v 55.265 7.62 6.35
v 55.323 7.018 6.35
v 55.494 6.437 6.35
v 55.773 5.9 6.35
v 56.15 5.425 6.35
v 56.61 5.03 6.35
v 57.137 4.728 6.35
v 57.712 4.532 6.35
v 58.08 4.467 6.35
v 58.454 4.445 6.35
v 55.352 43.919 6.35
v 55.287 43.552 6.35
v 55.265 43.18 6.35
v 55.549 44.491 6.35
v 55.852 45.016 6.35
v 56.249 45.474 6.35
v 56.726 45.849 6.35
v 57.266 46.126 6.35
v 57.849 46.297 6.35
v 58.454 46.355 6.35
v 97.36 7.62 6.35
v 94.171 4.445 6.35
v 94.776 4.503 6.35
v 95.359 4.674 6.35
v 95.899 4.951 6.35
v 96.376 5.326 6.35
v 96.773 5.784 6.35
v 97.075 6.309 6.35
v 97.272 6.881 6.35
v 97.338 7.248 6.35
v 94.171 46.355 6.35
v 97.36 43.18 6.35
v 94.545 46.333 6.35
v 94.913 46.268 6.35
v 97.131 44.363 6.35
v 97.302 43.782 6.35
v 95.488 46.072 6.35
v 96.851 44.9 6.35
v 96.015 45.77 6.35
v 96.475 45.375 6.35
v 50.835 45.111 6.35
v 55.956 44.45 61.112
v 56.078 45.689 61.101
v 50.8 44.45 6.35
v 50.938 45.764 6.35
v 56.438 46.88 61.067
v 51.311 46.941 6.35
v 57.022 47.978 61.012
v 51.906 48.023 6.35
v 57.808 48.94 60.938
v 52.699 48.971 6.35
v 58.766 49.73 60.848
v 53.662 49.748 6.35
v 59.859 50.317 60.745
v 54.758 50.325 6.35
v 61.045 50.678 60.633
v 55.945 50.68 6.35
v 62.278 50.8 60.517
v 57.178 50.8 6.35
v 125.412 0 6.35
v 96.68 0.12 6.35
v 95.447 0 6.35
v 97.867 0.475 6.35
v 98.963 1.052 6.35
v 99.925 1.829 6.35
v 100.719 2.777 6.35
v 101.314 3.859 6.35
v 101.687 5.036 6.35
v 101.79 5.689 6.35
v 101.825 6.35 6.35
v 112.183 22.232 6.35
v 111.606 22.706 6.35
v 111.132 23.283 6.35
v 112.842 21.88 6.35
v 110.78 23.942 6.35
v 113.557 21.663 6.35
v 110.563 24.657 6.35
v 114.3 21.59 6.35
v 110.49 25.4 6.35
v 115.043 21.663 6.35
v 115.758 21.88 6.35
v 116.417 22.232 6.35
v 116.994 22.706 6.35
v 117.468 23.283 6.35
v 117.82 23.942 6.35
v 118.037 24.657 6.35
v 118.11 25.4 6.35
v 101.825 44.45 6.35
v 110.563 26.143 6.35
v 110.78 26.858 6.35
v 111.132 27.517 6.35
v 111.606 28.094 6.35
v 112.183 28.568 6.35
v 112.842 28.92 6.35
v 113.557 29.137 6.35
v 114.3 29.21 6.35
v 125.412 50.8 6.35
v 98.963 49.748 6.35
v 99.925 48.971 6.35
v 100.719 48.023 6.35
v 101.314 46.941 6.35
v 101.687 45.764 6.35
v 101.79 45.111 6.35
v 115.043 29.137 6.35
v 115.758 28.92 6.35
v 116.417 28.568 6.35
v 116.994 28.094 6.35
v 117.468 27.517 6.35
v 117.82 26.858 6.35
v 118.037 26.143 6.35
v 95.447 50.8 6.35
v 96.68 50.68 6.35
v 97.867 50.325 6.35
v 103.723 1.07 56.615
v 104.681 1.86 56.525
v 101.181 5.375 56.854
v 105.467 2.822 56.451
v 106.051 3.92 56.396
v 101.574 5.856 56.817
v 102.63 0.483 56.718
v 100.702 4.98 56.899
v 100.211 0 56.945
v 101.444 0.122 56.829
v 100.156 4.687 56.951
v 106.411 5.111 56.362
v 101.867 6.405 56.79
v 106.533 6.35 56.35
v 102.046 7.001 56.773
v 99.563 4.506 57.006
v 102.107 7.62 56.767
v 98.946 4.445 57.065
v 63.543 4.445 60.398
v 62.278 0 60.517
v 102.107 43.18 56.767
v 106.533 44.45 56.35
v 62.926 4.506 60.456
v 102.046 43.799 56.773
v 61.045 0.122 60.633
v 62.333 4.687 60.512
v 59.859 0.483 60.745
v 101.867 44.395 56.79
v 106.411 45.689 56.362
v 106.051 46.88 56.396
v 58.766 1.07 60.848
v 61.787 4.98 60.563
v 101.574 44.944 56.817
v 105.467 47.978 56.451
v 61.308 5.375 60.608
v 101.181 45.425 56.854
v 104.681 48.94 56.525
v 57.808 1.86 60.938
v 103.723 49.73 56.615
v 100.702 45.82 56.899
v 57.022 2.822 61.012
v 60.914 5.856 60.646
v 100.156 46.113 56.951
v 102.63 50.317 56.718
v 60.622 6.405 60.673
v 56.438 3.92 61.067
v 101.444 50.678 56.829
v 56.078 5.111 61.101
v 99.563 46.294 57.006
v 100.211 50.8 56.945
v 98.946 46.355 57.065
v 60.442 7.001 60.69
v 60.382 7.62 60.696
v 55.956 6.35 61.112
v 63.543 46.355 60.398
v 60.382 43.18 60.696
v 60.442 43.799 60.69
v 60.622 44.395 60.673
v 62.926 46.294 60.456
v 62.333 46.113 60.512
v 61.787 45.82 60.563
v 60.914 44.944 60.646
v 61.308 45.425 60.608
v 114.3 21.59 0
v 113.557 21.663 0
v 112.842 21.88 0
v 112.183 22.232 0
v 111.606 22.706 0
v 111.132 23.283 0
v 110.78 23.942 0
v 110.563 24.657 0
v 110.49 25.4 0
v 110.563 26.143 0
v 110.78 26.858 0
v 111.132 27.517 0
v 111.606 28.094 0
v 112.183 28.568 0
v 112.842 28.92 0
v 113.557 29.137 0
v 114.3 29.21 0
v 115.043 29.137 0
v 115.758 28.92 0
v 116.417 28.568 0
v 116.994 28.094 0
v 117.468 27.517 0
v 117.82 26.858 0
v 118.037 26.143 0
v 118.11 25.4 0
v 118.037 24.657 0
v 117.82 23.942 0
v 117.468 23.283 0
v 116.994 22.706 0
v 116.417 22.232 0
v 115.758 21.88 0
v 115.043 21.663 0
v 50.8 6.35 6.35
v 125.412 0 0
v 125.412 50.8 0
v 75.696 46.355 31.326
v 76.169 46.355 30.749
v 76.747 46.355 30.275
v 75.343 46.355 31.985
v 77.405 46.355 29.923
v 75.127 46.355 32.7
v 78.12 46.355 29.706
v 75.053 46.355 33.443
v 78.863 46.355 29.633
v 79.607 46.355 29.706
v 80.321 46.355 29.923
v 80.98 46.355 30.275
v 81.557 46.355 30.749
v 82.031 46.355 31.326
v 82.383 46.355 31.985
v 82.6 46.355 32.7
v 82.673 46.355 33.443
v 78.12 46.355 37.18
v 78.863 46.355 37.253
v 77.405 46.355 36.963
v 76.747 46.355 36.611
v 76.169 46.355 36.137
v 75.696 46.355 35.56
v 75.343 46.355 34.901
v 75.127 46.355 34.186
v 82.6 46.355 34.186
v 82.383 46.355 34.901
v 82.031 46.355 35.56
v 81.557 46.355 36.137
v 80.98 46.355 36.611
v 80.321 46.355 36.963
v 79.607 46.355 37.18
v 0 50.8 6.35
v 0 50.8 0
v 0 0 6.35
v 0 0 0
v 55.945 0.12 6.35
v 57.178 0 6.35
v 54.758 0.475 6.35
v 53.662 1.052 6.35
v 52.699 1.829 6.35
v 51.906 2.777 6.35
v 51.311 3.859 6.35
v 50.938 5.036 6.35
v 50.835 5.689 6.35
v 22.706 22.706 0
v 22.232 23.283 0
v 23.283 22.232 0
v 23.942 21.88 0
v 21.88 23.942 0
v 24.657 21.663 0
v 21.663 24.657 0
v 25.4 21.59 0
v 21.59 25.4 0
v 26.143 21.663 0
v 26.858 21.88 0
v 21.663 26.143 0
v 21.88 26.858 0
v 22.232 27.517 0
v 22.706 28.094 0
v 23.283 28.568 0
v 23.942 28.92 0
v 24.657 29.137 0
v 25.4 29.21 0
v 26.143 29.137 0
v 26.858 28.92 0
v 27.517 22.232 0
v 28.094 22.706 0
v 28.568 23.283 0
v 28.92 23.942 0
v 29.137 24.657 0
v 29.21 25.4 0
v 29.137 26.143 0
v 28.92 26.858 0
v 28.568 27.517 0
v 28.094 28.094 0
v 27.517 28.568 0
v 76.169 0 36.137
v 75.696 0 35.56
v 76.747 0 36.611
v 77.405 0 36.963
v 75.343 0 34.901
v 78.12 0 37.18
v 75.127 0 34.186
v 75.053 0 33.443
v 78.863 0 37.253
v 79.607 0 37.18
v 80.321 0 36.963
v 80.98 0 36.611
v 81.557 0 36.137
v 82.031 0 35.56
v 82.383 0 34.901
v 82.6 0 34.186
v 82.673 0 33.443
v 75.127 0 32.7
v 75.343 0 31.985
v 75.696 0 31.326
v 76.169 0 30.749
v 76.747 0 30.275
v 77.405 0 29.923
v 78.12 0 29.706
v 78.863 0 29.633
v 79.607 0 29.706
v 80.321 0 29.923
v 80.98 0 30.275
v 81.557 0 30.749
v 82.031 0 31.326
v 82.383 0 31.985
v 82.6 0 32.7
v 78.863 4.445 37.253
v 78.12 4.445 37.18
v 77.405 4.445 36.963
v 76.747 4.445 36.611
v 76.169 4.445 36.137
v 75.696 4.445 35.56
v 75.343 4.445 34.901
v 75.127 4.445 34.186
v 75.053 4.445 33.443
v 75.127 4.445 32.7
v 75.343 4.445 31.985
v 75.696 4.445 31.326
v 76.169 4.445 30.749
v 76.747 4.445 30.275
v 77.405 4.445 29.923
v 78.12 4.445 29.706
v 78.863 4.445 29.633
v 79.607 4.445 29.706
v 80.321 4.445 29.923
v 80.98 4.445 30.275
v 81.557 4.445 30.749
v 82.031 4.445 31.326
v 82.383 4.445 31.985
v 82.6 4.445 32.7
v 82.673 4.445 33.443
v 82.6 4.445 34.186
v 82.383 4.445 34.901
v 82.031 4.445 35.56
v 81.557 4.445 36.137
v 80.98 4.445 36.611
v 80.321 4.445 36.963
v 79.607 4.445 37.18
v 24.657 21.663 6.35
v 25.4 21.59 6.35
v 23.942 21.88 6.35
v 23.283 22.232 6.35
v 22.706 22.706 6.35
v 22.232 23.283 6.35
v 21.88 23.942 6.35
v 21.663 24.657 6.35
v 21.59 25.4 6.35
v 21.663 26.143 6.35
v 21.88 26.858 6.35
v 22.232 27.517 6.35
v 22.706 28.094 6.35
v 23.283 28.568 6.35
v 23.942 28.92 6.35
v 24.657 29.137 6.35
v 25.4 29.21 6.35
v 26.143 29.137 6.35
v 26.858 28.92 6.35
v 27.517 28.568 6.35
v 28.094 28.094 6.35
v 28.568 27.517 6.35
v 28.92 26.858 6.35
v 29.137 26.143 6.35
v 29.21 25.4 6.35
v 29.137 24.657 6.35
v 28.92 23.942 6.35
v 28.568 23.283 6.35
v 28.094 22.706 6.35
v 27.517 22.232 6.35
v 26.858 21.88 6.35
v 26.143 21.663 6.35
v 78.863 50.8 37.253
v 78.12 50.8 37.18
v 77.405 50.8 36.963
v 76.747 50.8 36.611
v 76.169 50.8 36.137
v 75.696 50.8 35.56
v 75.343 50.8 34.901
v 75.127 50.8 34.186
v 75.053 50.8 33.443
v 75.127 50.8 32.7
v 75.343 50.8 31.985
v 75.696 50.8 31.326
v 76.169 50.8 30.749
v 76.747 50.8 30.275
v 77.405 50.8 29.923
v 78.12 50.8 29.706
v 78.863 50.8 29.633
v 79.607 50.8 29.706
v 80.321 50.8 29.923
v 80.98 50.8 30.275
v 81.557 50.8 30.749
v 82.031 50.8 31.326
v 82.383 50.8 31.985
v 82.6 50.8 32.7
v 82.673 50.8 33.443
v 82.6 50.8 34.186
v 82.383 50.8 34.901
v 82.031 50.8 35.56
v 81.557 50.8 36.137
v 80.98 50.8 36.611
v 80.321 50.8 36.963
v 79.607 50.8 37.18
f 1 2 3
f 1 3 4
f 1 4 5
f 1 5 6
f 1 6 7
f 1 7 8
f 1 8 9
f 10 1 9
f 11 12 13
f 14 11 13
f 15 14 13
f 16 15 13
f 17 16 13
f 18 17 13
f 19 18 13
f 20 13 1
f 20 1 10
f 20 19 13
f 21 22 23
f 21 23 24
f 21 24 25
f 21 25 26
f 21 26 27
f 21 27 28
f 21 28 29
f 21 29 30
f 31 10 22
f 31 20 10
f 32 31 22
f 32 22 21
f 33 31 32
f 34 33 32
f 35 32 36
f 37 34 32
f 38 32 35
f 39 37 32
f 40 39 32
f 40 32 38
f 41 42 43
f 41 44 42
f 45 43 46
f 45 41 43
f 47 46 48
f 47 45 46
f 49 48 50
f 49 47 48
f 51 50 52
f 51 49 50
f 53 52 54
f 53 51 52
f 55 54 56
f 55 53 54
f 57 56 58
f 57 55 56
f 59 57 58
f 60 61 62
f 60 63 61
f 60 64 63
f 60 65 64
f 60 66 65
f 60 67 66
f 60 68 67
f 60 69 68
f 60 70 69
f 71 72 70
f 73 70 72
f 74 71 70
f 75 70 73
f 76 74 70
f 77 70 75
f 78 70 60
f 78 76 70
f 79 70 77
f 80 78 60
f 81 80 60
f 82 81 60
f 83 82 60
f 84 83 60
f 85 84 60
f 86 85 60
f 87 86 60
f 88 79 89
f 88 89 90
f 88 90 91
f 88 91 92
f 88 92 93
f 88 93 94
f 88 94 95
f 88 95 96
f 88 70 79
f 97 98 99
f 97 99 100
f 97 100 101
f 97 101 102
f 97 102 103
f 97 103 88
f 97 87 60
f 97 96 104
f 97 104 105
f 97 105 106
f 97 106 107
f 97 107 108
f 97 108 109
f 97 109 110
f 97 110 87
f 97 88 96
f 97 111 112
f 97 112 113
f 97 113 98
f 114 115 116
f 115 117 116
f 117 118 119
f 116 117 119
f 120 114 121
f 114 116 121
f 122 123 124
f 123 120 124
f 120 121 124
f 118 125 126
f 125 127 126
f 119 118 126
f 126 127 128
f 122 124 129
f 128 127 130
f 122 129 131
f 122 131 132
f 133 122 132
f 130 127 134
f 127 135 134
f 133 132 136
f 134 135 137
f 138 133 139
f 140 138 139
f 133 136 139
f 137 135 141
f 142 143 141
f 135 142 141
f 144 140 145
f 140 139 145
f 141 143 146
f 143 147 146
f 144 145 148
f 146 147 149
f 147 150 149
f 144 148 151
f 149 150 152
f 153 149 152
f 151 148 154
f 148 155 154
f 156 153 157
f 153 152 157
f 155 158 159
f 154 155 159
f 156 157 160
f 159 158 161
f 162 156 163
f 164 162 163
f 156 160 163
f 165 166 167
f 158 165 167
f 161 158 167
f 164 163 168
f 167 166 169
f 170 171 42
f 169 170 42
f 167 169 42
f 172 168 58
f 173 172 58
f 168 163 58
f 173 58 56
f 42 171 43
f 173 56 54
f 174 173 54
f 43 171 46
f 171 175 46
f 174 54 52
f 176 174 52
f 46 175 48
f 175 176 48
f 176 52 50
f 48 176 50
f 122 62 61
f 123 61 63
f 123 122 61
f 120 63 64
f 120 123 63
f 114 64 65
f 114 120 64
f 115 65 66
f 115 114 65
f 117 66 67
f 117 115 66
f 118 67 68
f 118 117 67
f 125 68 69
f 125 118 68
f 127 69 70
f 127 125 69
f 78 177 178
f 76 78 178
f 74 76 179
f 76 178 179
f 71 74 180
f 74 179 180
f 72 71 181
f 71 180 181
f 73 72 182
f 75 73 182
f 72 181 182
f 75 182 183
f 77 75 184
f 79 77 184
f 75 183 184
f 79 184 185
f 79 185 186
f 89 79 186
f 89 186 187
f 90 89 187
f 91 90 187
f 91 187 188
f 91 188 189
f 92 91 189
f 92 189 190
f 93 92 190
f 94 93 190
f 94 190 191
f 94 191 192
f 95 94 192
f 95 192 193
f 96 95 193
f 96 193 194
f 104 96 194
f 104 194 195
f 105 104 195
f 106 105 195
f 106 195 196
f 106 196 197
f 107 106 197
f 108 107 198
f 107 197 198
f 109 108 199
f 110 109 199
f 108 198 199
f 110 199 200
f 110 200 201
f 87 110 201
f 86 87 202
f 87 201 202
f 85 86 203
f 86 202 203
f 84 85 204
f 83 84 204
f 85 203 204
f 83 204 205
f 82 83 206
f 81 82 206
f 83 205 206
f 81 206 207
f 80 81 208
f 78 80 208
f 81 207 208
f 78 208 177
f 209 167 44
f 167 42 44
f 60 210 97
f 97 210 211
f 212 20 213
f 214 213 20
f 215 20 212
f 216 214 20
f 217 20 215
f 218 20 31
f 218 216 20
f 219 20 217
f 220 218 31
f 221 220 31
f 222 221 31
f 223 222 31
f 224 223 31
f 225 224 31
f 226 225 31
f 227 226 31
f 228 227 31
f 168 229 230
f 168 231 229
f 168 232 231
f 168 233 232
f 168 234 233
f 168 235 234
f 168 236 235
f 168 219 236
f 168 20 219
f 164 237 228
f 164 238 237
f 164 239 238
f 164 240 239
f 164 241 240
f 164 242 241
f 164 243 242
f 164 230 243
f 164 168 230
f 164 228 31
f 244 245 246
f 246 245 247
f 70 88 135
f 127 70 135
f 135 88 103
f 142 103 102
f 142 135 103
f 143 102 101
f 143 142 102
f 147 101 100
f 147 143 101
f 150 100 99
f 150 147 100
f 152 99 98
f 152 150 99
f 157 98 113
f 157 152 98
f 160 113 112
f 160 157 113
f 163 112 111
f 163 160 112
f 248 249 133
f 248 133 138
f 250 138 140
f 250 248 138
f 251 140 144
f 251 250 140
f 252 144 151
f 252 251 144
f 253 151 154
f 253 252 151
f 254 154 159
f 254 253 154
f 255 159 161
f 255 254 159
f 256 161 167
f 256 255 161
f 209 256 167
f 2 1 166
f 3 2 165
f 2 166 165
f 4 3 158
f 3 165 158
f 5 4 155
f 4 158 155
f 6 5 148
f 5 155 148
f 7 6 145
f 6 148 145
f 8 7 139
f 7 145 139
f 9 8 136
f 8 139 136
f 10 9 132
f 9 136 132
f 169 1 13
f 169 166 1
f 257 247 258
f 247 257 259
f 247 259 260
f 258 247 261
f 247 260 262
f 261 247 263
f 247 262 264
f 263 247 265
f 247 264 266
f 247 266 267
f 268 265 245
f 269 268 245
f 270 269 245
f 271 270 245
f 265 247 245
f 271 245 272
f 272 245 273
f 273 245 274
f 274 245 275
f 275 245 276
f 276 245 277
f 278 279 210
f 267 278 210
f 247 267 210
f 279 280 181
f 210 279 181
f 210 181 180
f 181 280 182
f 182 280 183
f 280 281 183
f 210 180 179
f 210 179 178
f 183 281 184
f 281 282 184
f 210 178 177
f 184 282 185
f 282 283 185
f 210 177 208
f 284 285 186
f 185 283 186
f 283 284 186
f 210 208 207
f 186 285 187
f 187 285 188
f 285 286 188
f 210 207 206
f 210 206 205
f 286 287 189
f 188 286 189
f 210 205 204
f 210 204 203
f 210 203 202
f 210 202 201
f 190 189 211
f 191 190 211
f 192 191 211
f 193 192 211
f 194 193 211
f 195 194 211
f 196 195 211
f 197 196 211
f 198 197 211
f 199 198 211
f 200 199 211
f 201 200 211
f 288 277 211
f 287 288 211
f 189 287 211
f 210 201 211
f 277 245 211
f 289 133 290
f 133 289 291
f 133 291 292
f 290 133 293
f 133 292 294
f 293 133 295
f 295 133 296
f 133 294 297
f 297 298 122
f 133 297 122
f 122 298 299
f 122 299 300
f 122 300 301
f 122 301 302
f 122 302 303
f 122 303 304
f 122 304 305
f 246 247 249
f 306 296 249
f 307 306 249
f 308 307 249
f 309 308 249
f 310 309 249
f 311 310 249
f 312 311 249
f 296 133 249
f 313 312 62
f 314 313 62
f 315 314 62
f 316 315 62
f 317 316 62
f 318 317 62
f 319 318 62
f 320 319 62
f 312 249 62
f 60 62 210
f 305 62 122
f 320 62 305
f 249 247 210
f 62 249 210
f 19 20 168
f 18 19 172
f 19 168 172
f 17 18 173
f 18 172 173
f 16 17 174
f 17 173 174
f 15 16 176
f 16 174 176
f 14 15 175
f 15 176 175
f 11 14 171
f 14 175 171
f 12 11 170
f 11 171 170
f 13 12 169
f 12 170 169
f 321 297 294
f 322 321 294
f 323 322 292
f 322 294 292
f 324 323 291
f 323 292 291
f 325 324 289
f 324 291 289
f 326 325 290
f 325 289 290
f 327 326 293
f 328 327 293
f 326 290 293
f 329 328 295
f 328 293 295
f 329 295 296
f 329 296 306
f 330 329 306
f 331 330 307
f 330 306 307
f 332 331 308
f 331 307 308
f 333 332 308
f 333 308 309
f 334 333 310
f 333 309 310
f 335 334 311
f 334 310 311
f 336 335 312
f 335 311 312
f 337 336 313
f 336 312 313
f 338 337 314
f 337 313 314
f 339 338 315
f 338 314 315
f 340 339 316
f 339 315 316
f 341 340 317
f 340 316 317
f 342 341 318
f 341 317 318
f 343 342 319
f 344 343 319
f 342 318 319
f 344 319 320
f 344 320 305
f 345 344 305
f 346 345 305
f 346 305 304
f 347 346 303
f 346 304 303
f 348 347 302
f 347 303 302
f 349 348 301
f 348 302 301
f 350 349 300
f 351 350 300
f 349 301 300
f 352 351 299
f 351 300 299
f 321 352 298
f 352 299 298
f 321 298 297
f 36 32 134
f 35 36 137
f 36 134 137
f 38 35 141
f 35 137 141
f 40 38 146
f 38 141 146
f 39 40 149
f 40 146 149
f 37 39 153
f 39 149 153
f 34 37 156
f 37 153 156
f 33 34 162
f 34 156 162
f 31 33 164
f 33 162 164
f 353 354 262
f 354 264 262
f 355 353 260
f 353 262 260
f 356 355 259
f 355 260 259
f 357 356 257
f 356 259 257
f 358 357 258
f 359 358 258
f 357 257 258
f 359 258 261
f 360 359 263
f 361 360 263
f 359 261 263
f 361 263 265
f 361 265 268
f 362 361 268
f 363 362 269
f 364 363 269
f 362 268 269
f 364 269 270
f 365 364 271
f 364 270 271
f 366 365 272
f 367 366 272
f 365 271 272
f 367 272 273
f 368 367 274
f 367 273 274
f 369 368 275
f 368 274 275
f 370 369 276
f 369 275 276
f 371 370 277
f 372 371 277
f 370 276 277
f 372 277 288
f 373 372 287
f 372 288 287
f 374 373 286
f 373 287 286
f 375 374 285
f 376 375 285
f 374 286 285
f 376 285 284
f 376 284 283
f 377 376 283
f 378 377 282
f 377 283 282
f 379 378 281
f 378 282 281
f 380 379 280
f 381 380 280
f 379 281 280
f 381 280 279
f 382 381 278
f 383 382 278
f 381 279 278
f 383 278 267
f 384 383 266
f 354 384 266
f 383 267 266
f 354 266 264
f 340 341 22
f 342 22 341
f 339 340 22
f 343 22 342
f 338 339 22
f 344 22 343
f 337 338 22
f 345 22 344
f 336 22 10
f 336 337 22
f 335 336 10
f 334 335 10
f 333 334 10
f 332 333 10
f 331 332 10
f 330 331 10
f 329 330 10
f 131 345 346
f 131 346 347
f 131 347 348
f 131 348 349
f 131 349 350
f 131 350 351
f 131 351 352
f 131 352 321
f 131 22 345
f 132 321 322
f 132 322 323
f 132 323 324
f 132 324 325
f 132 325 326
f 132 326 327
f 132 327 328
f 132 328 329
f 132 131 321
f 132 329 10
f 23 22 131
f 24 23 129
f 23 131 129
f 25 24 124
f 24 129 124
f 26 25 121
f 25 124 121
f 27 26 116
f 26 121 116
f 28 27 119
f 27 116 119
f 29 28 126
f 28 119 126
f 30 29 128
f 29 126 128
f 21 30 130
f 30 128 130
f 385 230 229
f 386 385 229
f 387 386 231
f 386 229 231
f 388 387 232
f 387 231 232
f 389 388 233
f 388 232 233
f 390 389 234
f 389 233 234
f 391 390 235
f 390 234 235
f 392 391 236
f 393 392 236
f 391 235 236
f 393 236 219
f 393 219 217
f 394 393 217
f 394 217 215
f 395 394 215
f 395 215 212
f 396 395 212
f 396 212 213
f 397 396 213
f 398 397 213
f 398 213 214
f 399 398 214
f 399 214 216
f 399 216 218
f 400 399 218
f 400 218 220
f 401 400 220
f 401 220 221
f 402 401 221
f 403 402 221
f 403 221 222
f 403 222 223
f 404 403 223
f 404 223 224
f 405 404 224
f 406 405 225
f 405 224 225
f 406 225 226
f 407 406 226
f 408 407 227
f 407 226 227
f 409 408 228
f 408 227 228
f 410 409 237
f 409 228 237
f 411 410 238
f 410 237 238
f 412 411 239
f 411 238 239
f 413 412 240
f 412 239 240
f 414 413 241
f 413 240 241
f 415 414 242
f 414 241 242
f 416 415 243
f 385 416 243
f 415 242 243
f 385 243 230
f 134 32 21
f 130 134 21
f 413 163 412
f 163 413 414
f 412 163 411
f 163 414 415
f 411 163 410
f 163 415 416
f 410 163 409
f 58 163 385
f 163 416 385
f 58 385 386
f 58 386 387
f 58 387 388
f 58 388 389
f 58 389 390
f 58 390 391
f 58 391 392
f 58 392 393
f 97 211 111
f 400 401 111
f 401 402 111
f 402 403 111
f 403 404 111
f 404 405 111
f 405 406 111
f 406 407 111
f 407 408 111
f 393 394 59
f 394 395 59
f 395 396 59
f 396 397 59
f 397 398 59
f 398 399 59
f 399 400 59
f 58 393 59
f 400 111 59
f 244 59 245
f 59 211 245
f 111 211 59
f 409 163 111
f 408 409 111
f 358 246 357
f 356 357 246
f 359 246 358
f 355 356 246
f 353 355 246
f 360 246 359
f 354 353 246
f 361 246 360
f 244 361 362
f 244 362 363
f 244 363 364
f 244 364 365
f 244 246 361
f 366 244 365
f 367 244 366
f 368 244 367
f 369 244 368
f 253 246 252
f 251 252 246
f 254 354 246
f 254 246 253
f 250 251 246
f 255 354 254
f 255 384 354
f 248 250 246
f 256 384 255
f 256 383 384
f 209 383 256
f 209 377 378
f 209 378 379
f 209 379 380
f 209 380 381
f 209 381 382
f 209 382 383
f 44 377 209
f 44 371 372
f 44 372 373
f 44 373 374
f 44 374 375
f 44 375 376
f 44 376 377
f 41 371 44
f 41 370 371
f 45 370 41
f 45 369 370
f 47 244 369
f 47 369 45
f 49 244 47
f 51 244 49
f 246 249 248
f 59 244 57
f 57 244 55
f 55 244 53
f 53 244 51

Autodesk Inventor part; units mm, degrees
ref_plane "YZ Plane" through (0, 0, 0) normal (1, 0, 0) x (0, 1, 0)
ref_plane "XZ Plane" through (0, 0, 0) normal (0, 1, 0) x (-1, 0, 0)
ref_plane "XY Plane" through (0, 0, 0) normal (0, 0, 1) x (1, 0, 0)
sketch "Sketch1" plane through (0, 0, 0) normal (0, 0, 1) x (1, 0, 0)
  line L0 (0, 0) -> (125.4125, 0)
  line L1 (125.4125, 0) -> (125.4125, 50.8)
  line L2 (125.4125, 50.8) -> (0, 50.8)
  line L3 (0, 50.8) -> (0, 0)
  dimension "d0" = 50.8
  dimension "d1" = 125.4125
extrude "Extrusion1" add sketch "Sketch1" along normal blind 6.35
sketch "Sketch2" plane through (0, 0, 6.35) normal (0, 0, 1) x (1, 0, 0)
  line L0 (0, 0) -> (0, 50.8) projected
  line L1 (125.4125, 50.8) -> (125.4125, 0) projected
  point P0 (25.4, 25.4)
  point P1 (114.3, 25.4)
  point P2 (0, 25.4)
  dimension "d4" = 25.4
  dimension "d5" = 11.1125
hole "Hole1" at (25.4, 25.4, 6.35) at (114.3, 25.4, 6.35) direction (0, 0, -1) diameter 7.62 end through all
sketch "Sketch3" plane through (0, 50.8, 0) normal (0, 1, 0) x (1, 0, 0)
  line L0 (0, -6.35) -> (125.4125, -6.35) projected
  line L1 (0, 0) -> (0, -6.35) projected
  line L2 (101.8247, -6.35) -> (106.5326, -56.3502)
  line L3 (106.5326, -56.3502) -> (55.9563, -61.1124)
  line L4 (55.9563, -61.1124) -> (50.8, -6.35)
  dimension "d13" = 50.8
  dimension "d14" = 50.8
  dimension "d15" = 54.7624
  dimension "d16" = 5.379
extrude "Extrusion2" add sketch "Sketch3" against normal up to surface (50.8 mm away)
sketch "Sketch4" plane through (106.5326, 0, 56.3502) normal (0.0937434, 0, 0.9955964) x (0.9955964, 0, -0.0937434)
  line L0 (-50.8, 50.8) -> (0, 50.8) projected
  line L1 (-50.8, 50.8) -> (-50.8, 0) projected
  line L2 (-43.18, 46.355) -> (-7.62, 46.355)
  line L3 (-4.445, 43.18) -> (-4.445, 7.62)
  line L4 (-7.62, 4.445) -> (-43.18, 4.445)
  line L5 (-46.355, 7.62) -> (-46.355, 43.18)
  arc A0 (-43.18, 46.355) -> (-46.355, 43.18) centre (-43.18, 43.18) ccw
  arc A1 (-46.355, 7.62) -> (-43.18, 4.445) centre (-43.18, 7.62) ccw
  arc A2 (-7.62, 4.445) -> (-4.445, 7.62) centre (-7.62, 7.62) ccw
  arc A3 (-4.445, 43.18) -> (-7.62, 46.355) centre (-7.62, 43.18) ccw
  point P0 (-100.781, 0)
  point P1 (-25.4, 46.355)
  point P2 (-25.4, 50.8)
  point P3 (-46.355, 25.4)
  point P4 (-50.8, 25.4)
  dimension "d19" = 3.175
  dimension "d20" = 4.445
  dimension "d21" = 4.445
extrude "Extrusion3" cut sketch "Sketch4" against normal up to surface surface through (62.7063, 25.4, 6.35) normal (0, 0, 1)
fillet "Fillet1" radius 6.35 4 edges at (53.3782, 50.8, 33.7312) (53.3782, 0, 33.7312) (104.1787, 50.8, 31.3501) (104.1787, 0, 31.3501)
hole "Hole2" at (78.8634, 50.8, 33.4432) direction (0, -1, 0) diameter 7.62 end through all
properties part number "frame bracket" material "Steel"
